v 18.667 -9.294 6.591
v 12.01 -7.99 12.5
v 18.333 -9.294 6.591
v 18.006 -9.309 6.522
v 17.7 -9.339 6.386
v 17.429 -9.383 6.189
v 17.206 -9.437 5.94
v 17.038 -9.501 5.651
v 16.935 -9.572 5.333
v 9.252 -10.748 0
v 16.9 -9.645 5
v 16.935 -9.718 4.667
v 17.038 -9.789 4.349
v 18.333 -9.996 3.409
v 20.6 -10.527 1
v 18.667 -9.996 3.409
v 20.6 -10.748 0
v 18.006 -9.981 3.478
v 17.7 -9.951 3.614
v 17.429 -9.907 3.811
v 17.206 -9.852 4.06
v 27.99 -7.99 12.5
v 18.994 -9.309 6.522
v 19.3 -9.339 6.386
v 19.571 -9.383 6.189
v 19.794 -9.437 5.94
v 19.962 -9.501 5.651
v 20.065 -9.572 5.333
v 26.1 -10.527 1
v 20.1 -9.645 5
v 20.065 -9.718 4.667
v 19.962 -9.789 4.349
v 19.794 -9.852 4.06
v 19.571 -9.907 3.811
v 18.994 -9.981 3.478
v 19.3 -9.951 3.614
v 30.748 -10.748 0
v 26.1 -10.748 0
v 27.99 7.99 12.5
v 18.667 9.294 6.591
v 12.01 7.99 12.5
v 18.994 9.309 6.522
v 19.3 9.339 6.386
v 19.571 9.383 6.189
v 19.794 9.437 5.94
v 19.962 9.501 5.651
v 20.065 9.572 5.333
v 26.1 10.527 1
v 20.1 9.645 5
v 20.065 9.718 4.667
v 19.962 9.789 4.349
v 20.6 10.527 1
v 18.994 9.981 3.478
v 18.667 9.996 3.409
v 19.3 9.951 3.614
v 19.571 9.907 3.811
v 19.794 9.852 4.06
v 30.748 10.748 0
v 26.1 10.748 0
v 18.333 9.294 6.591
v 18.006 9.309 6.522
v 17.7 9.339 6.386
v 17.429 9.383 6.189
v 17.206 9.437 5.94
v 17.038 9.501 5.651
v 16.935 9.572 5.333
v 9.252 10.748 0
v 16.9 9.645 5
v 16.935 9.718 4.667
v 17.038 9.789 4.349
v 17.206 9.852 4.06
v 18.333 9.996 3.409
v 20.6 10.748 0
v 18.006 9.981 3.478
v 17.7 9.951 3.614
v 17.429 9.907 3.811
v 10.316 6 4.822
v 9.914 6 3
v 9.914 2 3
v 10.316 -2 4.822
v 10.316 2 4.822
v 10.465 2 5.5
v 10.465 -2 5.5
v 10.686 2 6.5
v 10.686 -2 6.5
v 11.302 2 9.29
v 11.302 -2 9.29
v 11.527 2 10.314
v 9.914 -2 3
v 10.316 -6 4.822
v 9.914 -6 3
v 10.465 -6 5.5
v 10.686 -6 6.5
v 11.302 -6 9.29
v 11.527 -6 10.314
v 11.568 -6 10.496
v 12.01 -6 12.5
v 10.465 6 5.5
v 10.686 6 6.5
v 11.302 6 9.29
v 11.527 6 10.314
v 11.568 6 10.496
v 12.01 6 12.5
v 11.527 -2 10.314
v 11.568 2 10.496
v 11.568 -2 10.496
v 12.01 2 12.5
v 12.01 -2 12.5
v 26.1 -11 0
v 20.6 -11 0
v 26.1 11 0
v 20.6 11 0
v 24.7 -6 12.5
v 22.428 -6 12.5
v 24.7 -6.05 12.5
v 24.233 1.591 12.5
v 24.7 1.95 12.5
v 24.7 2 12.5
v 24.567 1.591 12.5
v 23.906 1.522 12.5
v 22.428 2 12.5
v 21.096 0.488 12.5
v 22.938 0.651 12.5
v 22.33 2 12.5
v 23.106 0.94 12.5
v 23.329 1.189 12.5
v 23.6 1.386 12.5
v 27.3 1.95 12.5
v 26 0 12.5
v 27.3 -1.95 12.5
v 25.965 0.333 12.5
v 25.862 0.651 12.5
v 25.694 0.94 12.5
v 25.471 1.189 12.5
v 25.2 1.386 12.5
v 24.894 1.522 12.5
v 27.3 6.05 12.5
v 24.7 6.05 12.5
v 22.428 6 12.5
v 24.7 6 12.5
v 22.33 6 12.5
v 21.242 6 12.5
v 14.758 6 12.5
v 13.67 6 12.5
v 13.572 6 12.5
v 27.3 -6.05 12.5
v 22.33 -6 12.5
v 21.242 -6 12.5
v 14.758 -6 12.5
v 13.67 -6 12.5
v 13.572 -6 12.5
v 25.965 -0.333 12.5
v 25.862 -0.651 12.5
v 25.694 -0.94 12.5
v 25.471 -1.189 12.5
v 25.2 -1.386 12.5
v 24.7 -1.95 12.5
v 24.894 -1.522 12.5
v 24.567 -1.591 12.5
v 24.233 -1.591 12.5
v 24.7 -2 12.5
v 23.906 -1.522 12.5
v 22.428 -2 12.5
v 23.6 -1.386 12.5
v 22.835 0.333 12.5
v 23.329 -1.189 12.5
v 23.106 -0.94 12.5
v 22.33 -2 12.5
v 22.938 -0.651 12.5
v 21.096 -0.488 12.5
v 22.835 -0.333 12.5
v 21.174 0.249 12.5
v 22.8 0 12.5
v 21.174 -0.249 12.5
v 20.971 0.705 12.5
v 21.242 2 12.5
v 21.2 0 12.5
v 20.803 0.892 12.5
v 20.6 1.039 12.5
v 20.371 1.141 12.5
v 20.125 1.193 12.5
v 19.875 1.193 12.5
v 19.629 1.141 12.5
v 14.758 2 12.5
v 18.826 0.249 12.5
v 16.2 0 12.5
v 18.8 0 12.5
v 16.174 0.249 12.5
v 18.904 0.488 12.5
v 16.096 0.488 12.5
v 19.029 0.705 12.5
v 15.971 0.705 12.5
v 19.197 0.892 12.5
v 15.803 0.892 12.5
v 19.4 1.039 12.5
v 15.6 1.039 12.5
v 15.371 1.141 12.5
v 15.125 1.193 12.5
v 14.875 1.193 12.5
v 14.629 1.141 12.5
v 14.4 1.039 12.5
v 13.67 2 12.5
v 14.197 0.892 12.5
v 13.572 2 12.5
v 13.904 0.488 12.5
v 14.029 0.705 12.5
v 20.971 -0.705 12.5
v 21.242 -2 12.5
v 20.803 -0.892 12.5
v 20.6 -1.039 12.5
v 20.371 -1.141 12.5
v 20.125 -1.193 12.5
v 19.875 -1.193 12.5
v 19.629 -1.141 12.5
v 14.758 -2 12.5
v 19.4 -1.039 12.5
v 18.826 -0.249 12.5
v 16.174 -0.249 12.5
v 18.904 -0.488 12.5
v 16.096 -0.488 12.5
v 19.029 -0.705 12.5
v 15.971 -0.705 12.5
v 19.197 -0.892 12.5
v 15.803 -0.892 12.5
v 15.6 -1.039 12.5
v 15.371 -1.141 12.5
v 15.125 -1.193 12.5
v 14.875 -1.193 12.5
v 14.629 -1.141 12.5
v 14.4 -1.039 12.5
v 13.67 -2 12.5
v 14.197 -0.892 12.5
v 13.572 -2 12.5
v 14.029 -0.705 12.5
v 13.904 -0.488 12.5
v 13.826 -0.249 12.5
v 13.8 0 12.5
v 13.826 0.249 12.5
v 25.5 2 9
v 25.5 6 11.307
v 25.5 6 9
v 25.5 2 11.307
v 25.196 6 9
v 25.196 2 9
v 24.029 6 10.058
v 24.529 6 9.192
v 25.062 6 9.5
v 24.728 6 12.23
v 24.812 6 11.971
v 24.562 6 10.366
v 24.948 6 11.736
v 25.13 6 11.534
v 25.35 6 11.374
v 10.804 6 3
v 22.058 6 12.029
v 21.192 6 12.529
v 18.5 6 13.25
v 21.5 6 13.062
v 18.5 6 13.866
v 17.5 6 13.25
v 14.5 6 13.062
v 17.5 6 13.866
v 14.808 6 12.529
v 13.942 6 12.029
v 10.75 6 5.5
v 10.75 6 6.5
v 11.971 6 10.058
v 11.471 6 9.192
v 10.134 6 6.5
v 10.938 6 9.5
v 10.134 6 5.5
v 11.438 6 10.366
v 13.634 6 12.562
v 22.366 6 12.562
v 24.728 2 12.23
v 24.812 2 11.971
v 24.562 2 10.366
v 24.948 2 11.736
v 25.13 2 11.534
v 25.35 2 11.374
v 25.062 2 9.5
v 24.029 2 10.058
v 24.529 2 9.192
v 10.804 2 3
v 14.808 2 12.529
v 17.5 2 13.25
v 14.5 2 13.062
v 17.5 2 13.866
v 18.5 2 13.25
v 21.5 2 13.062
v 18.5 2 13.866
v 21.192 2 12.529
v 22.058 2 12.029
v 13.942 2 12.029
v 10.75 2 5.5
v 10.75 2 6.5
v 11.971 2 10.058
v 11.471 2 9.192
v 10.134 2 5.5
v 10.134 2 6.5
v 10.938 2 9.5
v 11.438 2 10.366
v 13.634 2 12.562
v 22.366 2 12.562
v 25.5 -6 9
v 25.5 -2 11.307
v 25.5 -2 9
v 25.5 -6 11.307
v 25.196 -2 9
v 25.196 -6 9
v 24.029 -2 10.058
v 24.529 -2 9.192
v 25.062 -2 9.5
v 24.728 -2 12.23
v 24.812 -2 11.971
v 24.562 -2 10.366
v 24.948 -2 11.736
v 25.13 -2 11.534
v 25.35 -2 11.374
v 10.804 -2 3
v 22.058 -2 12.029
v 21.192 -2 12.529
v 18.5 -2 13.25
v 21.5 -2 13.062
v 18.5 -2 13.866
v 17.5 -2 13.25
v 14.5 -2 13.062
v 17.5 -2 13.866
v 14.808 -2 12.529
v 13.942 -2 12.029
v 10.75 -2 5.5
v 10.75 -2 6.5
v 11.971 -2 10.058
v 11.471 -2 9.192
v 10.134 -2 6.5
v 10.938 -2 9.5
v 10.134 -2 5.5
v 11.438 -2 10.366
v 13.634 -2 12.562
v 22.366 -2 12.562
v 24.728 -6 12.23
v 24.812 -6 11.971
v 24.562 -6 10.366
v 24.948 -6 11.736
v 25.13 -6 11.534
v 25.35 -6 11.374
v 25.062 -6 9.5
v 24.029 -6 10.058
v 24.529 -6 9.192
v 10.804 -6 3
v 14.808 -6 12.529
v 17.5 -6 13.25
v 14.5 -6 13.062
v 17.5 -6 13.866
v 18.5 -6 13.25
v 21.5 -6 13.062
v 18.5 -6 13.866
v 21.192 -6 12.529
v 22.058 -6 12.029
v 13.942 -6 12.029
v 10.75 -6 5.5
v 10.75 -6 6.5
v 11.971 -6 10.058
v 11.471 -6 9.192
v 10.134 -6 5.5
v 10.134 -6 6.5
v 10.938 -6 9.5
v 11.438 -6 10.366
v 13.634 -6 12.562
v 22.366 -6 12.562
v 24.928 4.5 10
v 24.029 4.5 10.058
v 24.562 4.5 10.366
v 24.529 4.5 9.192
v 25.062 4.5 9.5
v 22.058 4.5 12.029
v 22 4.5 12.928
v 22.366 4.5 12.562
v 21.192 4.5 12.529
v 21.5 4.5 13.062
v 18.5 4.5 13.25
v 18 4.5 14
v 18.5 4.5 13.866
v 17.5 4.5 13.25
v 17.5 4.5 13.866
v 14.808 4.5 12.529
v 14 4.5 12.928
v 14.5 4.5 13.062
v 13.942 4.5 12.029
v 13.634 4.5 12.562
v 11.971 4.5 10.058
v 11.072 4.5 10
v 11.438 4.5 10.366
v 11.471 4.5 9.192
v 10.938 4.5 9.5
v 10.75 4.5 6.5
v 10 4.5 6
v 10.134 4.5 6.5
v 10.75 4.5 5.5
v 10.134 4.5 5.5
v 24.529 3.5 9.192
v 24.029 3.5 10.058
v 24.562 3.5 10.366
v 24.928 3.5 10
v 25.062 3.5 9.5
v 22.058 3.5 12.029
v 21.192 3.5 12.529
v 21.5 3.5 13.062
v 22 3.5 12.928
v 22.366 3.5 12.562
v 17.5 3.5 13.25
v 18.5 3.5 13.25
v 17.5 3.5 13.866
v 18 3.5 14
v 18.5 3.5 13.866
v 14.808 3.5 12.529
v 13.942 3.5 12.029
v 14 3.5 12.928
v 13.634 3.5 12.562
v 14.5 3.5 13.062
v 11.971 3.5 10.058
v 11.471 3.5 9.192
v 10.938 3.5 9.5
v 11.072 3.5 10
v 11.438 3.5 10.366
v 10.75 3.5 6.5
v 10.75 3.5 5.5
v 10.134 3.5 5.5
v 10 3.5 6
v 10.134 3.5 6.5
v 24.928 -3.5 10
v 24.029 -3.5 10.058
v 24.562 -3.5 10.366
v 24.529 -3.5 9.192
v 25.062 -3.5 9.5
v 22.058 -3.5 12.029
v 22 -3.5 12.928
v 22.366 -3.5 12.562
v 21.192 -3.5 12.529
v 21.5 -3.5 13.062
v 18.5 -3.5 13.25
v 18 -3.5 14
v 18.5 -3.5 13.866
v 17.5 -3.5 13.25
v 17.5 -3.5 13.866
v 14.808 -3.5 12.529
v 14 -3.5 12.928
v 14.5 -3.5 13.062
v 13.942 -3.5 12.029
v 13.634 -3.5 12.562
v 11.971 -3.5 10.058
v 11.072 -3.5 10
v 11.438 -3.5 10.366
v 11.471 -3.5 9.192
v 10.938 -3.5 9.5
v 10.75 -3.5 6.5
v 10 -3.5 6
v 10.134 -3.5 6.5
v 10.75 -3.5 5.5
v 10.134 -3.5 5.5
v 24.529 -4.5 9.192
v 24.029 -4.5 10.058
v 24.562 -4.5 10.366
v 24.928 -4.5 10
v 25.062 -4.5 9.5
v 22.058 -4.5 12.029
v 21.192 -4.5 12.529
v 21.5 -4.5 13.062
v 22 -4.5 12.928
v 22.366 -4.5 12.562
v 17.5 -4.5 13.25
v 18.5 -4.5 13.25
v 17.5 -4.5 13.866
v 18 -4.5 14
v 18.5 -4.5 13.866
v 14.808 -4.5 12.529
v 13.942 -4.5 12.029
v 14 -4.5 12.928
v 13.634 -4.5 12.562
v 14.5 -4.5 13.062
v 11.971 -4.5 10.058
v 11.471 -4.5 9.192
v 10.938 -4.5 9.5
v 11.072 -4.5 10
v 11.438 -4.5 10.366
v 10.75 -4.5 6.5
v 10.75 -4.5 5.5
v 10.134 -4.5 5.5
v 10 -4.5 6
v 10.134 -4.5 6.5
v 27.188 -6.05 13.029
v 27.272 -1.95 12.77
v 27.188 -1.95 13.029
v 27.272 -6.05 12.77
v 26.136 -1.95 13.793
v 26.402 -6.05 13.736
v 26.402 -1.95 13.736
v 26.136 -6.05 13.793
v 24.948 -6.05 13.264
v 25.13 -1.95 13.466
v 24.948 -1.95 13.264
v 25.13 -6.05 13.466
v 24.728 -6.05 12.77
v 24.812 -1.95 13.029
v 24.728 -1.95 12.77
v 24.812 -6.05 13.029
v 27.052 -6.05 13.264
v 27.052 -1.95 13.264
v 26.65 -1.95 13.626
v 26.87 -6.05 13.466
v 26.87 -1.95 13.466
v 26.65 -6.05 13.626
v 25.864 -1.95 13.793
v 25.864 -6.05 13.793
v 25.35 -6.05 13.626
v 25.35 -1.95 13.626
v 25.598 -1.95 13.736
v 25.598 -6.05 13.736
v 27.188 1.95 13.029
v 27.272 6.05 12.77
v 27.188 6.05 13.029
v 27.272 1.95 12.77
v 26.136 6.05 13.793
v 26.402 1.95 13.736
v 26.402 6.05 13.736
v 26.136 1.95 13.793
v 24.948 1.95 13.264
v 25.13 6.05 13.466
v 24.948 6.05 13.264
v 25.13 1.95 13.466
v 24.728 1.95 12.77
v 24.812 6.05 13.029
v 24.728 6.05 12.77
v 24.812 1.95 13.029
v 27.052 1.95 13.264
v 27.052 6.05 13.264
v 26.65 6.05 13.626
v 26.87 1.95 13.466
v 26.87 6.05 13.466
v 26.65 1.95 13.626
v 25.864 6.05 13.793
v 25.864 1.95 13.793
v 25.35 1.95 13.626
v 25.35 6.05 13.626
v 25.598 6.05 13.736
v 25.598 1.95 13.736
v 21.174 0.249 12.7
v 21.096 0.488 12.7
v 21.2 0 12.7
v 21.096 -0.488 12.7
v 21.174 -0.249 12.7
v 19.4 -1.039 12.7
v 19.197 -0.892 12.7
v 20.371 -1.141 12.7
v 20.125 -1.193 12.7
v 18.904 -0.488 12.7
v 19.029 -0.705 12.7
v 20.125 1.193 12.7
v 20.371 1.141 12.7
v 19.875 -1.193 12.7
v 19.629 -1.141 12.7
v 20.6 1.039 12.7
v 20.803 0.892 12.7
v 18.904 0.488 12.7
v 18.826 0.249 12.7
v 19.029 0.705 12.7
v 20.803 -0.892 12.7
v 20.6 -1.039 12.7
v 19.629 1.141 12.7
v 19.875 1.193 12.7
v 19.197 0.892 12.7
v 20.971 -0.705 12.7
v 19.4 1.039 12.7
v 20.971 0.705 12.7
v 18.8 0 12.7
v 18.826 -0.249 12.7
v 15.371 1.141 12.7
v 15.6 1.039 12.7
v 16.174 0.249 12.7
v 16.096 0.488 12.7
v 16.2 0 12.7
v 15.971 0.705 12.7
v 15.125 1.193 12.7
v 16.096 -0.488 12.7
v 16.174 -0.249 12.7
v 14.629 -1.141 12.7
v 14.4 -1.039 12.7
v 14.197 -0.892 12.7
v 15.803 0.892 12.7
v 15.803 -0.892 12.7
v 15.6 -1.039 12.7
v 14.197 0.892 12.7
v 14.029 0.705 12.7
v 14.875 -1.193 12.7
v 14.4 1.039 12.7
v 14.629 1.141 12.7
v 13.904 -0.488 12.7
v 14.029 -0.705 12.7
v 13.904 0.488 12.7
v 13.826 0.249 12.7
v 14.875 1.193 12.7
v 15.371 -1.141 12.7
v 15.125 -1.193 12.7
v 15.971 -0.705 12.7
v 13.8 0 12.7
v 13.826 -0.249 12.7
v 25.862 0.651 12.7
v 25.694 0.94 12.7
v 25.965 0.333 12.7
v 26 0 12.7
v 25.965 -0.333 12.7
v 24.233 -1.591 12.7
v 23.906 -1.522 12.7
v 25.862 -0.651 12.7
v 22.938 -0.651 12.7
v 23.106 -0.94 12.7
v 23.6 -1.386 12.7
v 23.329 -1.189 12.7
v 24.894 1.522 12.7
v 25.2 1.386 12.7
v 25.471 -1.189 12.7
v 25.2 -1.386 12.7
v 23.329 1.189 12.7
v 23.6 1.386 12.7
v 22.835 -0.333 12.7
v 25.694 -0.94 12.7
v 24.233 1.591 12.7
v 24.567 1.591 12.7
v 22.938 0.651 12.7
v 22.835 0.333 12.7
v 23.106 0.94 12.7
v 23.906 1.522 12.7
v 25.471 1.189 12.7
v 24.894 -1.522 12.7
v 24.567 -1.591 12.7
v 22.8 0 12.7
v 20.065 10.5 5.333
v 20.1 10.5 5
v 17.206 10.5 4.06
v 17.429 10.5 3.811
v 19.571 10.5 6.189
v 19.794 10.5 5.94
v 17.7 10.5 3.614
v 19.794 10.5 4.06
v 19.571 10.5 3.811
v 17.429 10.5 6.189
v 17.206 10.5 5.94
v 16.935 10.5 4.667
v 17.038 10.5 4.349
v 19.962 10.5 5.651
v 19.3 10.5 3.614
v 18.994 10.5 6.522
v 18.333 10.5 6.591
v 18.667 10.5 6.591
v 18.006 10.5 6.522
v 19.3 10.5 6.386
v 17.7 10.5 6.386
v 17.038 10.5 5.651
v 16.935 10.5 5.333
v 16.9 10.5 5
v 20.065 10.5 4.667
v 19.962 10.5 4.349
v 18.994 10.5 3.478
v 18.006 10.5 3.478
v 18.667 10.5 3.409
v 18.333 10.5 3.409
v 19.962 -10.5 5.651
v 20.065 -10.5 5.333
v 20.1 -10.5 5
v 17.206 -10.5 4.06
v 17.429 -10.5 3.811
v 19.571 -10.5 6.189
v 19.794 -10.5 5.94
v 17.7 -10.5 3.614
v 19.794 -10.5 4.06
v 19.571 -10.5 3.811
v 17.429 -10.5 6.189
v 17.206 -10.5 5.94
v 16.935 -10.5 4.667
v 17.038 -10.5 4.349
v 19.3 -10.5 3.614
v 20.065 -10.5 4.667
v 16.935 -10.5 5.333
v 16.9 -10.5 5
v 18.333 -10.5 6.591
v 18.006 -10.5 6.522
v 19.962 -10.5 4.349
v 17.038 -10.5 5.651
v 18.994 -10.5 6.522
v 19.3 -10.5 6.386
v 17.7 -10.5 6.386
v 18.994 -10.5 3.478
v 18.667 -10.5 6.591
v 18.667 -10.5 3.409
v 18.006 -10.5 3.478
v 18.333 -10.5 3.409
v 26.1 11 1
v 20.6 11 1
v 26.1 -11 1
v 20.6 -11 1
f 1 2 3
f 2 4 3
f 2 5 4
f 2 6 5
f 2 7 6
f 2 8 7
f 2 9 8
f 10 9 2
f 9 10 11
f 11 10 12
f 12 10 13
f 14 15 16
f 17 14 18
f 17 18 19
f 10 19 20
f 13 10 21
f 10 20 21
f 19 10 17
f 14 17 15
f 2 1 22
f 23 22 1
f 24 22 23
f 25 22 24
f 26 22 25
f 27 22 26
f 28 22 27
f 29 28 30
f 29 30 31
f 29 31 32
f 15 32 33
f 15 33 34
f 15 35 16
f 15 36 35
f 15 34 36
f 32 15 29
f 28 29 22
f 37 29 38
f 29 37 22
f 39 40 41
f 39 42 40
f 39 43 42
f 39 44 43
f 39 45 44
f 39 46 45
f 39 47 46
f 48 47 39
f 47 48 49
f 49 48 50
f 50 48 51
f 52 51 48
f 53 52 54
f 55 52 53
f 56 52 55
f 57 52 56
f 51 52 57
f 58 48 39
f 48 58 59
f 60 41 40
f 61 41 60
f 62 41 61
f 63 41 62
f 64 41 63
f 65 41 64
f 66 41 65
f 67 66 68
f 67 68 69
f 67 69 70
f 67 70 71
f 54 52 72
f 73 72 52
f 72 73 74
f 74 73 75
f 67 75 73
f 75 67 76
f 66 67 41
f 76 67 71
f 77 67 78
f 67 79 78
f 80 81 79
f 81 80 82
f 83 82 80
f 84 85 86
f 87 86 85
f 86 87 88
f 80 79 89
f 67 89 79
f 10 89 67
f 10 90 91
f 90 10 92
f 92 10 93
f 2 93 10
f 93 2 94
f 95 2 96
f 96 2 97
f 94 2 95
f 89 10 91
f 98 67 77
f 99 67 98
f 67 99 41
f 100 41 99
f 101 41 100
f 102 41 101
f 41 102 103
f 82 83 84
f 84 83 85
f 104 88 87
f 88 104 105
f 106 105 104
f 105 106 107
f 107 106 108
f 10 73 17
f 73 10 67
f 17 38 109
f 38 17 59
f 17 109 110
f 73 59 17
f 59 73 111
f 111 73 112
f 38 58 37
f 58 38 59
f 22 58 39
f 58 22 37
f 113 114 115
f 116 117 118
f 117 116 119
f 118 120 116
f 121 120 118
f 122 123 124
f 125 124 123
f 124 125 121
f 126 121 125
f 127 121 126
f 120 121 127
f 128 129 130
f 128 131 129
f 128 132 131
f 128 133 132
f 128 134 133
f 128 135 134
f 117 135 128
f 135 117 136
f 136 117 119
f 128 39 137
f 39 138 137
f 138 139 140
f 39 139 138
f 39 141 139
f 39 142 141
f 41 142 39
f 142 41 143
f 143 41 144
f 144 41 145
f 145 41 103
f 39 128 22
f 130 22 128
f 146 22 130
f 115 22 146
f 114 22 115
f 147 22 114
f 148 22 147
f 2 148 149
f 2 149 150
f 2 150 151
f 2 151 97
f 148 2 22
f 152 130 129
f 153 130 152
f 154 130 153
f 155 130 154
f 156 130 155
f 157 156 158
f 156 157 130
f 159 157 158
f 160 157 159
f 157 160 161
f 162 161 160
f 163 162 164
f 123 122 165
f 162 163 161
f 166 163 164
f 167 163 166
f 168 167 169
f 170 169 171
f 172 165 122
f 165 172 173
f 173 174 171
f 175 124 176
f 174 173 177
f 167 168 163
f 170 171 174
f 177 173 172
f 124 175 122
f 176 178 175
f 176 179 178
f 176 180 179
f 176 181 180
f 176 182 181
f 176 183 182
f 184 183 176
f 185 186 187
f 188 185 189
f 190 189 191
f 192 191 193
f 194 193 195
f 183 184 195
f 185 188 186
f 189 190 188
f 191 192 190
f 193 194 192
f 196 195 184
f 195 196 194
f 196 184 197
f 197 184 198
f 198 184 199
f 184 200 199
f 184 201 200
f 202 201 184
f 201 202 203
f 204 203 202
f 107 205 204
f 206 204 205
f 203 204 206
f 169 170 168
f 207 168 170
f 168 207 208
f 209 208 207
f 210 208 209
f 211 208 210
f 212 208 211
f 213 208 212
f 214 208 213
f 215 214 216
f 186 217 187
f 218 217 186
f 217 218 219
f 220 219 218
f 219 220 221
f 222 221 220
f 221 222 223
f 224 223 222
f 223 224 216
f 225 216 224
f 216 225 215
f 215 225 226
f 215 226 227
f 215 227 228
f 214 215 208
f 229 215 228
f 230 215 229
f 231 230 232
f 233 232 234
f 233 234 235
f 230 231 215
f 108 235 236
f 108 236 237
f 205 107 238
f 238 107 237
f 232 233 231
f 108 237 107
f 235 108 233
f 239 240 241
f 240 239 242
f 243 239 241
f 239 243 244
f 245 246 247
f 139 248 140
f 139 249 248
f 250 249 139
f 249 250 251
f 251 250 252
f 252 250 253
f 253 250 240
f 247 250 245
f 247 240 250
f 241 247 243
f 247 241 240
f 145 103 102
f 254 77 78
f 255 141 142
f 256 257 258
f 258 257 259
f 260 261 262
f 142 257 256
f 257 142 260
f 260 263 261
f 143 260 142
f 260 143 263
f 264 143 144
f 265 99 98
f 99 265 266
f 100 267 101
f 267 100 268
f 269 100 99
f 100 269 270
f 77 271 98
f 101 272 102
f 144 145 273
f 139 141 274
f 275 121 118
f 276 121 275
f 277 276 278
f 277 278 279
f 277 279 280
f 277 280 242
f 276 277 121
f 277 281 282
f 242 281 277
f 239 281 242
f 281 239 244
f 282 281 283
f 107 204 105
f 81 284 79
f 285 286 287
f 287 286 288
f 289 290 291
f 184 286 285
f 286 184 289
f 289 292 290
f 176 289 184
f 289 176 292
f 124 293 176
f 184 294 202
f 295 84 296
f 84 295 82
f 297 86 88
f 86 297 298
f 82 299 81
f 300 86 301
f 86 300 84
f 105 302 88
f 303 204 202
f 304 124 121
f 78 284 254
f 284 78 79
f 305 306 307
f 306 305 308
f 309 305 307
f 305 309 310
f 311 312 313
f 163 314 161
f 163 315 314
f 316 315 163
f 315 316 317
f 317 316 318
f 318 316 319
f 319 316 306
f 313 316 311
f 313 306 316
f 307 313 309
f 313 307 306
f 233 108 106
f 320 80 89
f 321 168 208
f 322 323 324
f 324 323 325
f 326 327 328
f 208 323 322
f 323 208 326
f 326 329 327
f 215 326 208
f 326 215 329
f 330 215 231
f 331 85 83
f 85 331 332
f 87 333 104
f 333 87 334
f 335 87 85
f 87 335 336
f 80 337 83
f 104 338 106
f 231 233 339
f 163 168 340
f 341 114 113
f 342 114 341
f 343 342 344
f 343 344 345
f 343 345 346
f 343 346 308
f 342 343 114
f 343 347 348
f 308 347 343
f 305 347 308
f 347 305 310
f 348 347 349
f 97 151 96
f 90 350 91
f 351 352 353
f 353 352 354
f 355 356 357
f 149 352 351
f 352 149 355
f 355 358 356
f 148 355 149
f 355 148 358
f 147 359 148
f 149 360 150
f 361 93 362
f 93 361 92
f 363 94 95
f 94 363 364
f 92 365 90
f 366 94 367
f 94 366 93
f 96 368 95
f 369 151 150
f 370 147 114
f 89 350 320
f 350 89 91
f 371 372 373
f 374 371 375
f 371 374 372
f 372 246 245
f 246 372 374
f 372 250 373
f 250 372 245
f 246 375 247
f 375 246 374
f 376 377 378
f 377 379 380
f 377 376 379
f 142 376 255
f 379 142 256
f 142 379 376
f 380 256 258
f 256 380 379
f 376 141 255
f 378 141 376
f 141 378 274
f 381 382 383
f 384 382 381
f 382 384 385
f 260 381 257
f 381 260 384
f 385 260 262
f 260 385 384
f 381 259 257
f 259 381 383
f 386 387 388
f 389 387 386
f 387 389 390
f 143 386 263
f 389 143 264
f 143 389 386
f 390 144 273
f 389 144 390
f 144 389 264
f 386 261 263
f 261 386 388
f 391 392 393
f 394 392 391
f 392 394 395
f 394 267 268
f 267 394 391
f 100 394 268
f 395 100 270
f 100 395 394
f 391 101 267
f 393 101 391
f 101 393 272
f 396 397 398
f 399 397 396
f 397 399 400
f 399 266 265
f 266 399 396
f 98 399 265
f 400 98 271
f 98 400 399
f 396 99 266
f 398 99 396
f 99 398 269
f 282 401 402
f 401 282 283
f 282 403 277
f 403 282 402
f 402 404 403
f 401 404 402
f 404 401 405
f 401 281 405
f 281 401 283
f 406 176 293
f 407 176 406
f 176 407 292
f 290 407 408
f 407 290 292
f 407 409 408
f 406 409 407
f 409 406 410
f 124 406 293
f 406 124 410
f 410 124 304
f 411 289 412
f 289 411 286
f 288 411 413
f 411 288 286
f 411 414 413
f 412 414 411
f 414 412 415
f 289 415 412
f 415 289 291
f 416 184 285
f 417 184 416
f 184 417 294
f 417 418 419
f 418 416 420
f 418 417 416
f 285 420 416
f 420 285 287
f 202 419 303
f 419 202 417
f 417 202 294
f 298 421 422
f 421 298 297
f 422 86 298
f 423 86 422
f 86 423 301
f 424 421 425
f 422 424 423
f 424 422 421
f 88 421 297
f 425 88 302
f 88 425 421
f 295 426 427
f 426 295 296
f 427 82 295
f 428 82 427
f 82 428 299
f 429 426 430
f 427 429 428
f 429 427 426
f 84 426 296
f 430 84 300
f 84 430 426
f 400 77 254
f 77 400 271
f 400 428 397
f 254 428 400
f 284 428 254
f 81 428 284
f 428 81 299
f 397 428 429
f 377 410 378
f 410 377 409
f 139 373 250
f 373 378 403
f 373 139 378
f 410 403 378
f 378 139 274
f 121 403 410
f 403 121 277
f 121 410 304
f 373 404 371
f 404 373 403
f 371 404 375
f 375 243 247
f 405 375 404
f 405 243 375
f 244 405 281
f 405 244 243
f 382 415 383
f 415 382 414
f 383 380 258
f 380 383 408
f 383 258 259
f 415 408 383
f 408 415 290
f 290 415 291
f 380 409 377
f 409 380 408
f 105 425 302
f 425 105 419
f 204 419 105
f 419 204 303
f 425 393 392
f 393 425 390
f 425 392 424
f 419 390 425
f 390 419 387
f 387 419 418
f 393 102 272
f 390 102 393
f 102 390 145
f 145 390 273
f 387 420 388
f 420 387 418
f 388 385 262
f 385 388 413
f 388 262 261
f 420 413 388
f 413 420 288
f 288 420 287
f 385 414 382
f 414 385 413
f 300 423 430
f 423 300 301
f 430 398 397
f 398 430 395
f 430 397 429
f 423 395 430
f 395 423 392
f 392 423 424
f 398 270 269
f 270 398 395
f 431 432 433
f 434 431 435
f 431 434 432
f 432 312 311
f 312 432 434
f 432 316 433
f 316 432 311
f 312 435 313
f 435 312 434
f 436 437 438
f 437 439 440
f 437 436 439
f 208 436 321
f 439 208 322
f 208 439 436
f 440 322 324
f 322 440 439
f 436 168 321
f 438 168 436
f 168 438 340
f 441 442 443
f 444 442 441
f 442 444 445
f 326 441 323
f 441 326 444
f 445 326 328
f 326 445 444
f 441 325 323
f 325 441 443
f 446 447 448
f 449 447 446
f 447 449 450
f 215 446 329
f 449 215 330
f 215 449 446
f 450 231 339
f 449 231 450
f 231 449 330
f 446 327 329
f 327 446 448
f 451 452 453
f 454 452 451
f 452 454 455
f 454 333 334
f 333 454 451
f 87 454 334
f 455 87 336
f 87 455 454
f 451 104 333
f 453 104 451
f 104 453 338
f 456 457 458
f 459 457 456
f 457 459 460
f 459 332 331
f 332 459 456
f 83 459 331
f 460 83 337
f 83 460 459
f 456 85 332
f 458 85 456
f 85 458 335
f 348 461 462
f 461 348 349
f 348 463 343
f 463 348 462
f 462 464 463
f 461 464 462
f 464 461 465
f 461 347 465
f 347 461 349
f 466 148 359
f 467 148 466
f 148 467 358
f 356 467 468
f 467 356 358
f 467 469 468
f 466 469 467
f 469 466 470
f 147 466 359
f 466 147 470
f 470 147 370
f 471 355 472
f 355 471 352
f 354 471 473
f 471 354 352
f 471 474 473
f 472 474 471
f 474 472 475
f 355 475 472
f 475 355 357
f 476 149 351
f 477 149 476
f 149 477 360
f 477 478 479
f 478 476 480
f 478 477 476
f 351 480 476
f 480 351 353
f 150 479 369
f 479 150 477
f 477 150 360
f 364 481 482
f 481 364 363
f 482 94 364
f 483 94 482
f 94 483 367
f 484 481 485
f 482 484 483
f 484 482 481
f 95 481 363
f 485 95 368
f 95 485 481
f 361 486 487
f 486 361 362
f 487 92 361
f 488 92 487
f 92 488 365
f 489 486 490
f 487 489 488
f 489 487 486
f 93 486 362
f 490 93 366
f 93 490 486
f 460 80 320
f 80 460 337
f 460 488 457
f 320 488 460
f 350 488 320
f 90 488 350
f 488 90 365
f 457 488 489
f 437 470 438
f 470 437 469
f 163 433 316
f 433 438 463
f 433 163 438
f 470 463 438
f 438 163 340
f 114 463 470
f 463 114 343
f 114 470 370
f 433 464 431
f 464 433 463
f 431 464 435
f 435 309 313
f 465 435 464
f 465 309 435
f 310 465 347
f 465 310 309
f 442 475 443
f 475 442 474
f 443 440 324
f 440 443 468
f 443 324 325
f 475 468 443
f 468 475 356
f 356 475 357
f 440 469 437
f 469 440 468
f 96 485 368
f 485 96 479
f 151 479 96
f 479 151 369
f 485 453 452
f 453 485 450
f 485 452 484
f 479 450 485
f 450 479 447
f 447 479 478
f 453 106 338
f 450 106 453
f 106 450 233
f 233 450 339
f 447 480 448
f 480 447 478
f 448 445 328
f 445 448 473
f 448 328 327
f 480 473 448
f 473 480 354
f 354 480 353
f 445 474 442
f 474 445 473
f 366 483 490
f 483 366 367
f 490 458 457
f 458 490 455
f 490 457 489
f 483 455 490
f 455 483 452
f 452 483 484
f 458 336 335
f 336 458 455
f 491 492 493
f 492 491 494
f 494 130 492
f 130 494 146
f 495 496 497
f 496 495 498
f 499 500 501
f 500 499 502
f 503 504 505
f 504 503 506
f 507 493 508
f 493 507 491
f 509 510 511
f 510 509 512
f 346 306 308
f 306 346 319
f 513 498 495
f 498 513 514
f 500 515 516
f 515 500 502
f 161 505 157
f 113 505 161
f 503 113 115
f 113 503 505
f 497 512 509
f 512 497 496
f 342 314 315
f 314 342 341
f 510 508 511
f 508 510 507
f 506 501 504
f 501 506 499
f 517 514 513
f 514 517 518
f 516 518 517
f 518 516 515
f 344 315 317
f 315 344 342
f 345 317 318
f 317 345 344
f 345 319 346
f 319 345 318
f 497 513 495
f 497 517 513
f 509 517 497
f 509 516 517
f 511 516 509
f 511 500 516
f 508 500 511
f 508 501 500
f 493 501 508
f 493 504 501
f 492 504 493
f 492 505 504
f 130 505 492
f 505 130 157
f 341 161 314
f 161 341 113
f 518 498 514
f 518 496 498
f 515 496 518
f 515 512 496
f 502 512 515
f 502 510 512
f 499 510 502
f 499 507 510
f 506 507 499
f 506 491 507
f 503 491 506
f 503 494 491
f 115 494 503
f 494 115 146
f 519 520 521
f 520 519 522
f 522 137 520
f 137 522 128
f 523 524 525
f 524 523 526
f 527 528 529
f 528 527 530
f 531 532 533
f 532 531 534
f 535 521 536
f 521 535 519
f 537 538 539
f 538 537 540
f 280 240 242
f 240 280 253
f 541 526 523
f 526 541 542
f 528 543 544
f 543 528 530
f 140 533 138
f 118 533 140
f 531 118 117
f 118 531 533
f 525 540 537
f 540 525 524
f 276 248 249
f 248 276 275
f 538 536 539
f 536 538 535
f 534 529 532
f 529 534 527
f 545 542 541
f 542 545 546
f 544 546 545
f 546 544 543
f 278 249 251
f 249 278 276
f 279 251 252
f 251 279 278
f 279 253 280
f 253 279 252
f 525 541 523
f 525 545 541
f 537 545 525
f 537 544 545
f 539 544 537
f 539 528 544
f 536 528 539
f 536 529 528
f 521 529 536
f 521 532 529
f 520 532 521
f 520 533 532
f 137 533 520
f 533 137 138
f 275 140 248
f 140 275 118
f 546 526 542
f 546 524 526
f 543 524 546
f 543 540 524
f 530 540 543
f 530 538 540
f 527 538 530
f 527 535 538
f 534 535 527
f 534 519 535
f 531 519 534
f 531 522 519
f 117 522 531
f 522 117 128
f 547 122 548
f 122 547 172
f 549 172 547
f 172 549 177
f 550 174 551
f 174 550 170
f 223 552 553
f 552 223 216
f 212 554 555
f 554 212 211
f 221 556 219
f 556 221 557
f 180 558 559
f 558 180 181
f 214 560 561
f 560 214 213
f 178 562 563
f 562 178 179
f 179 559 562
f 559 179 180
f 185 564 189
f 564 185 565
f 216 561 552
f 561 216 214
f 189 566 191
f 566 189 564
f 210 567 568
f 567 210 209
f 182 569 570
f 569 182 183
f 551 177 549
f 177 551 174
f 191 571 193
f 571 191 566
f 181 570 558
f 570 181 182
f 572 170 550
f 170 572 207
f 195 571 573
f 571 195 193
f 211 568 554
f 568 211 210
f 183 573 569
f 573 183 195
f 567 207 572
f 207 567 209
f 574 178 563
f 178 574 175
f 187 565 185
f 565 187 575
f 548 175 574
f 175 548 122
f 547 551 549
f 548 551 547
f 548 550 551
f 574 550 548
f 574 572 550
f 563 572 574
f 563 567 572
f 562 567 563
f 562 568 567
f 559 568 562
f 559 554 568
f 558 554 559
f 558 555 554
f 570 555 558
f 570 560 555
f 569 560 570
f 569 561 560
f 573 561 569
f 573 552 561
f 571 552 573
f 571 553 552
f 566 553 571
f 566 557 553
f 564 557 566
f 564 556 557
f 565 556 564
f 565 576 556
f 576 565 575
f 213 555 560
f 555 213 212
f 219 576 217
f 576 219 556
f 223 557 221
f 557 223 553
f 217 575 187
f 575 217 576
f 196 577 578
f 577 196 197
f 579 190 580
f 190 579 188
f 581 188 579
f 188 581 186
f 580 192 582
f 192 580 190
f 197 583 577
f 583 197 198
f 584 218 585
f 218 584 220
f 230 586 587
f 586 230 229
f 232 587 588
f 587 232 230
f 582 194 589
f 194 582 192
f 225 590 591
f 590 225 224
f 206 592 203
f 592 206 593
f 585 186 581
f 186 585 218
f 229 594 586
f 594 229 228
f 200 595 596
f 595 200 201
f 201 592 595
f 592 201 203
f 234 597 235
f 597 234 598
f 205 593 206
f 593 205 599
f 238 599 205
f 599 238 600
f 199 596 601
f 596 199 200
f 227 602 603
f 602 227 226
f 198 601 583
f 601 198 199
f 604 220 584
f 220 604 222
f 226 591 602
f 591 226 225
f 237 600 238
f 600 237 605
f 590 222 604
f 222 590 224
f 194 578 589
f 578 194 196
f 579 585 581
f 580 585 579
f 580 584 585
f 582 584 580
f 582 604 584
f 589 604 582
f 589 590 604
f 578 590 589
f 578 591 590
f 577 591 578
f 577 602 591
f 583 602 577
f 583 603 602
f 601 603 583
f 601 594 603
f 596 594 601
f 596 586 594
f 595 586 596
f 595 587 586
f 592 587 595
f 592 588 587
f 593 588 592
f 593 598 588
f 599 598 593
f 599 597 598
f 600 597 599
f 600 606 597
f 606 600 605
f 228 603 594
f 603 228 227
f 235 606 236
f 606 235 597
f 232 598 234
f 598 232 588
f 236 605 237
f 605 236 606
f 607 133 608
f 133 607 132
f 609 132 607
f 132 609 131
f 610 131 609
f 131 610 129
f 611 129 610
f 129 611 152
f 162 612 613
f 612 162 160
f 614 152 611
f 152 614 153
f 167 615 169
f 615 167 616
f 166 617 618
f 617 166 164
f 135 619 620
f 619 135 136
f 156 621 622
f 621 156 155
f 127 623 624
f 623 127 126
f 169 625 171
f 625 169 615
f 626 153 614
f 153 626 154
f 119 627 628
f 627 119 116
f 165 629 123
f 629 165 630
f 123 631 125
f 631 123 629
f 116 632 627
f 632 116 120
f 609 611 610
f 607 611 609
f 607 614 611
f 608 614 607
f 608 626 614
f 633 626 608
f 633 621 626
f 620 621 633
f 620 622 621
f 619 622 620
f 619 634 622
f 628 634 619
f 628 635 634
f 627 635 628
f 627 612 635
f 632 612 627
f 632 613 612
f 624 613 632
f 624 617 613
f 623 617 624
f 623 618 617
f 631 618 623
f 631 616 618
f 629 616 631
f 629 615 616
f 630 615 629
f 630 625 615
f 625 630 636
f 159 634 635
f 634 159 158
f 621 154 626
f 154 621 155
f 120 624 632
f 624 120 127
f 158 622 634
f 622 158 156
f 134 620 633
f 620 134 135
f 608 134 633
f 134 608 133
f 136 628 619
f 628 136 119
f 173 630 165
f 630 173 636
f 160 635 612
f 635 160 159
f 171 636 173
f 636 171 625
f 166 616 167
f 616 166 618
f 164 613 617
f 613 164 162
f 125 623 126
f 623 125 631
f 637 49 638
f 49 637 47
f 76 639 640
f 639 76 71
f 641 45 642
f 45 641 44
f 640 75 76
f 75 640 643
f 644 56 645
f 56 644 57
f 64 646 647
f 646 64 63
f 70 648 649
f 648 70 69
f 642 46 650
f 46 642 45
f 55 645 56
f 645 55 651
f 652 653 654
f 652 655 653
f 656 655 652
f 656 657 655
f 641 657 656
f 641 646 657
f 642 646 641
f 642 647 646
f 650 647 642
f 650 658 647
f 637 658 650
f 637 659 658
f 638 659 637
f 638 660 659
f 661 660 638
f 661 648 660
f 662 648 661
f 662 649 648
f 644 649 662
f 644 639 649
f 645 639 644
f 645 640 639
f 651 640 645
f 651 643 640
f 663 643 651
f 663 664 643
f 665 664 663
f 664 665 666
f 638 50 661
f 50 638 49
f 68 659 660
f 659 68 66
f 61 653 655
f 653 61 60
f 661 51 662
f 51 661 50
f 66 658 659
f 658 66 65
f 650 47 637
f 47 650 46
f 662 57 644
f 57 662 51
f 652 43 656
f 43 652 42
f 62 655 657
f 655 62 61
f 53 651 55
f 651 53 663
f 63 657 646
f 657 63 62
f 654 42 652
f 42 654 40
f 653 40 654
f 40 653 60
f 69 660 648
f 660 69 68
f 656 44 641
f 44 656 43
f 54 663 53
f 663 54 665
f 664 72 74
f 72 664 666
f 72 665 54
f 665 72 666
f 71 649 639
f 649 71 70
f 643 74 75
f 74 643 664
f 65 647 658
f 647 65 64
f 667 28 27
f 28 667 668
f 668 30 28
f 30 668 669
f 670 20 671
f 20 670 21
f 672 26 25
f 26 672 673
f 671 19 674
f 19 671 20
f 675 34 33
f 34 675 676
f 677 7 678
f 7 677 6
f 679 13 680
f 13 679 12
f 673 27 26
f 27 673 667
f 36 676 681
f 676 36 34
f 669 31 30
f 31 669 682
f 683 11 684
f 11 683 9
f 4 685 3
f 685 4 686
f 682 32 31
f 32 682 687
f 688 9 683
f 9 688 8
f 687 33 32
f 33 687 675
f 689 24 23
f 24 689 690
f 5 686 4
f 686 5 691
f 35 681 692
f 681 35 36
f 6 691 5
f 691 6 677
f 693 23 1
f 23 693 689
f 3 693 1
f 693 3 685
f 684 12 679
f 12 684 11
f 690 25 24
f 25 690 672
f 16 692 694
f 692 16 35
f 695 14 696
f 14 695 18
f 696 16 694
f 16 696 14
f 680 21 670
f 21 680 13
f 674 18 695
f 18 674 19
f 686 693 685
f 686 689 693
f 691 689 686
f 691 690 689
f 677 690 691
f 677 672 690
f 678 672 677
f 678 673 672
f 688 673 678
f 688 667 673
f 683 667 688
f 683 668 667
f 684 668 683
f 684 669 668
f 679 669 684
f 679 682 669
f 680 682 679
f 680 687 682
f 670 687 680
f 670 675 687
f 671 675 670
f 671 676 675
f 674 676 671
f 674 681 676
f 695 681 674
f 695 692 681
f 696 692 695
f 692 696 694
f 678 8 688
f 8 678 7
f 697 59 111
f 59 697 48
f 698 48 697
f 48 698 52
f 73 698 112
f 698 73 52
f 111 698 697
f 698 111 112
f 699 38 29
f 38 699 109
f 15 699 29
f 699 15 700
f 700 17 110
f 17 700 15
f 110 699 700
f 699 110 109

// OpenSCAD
/* turbolaser-top.scad
 *
 * Copyright (C) Robert B. Ross, 2014
 *
 * This software is released under the Creative Commons 
 * Attribution-ShareAlike 4.0 International Public License.
 *
 */

$fn=30;

// translate([-6.8 + 20,24,0]) rotate([0,0,-13]) import("./turbolaser-top-nolasers.stl");

translate([20,0,0]) body();


module body() {
    difference() {
	roughBody();
	translate([0,0,-2.5]) cube([24,24,5], center=true);
    }
}

module roughBody() {
    render(convexity=5) difference() {
	rotate([0,0,45]) cylinder($fn=4, r1=15.2,r2=11.3, h=12.5);

	/* cutouts for big wheels */
	translate([-3, 4,11]) cube([17,4,4], center=true);
	translate([-10, 4,5]) cube([3,4,4], center=true);
	translate([-3, -4,11]) cube([17,4,4], center=true);
	translate([-10, -4,5]) cube([3,4,4], center=true);
	// translate([-3,-4,8]) cube([17,4,10], center=true);
    }

    /* big wheels */
    translate([-2,6,6]) rotate([90,0,0]) wheel();
    translate([-2,-2,6]) rotate([90,0,0]) wheel();

    /* top cylinders */
    translate([6,-1.95,12.5]) rotate([90,0,0]) cylinder(r=1.3,h=4.1);
    translate([6,6.05,12.5]) rotate([90,0,0]) cylinder(r=1.3,h=4.1);

    /* top decoration */
    cylinder(r=1.2,h=12.7);
    translate([-5,0,0]) cylinder(r=1.2,h=12.7);
    translate([4.4,0,0]) cylinder(r=1.6,h=12.7);

    /* cylinders poking out sides */
    translate([-1.5,10.5,5]) rotate([90,0,0]) cylinder(r=1.6,h=2);
    translate([-1.5,-8.5,5]) rotate([90,0,0]) cylinder(r=1.6,h=2);

    /* bits on sides */
    translate([0.6,10,0]) cube([5.5,1,1]);
    translate([0.6,-11,0]) cube([5.5,1,1]);

}


module wheel() {
    assign(rad=8) difference() {
	//rotate([0,0,360/24]) 
	    cylinder($fn=12, r=rad,h=4);
	for (i = [0:5]) {
	    rotate([0,0,(360/12)*(i+1)]) translate([rad,0,0])
		translate([0,0,0.75]) cube([1.5,1,1.5],center=true);
	}
	translate([0,0,4-1.5]) for (i = [0:5]) {
	    rotate([0,0,(360/12)*(i+1)]) translate([rad,0,0])
		translate([0,0,0.75]) cube([1.5,1,1.5],center=true);
	}
    }
 }

/*
 * Local variables:
 *  mode: C
 *  c-indent-level: 4
 *  c-basic-offset: 4
 * End:
 *
 * vim: ts=8 sts=4 sw=4 expandtab
 */
